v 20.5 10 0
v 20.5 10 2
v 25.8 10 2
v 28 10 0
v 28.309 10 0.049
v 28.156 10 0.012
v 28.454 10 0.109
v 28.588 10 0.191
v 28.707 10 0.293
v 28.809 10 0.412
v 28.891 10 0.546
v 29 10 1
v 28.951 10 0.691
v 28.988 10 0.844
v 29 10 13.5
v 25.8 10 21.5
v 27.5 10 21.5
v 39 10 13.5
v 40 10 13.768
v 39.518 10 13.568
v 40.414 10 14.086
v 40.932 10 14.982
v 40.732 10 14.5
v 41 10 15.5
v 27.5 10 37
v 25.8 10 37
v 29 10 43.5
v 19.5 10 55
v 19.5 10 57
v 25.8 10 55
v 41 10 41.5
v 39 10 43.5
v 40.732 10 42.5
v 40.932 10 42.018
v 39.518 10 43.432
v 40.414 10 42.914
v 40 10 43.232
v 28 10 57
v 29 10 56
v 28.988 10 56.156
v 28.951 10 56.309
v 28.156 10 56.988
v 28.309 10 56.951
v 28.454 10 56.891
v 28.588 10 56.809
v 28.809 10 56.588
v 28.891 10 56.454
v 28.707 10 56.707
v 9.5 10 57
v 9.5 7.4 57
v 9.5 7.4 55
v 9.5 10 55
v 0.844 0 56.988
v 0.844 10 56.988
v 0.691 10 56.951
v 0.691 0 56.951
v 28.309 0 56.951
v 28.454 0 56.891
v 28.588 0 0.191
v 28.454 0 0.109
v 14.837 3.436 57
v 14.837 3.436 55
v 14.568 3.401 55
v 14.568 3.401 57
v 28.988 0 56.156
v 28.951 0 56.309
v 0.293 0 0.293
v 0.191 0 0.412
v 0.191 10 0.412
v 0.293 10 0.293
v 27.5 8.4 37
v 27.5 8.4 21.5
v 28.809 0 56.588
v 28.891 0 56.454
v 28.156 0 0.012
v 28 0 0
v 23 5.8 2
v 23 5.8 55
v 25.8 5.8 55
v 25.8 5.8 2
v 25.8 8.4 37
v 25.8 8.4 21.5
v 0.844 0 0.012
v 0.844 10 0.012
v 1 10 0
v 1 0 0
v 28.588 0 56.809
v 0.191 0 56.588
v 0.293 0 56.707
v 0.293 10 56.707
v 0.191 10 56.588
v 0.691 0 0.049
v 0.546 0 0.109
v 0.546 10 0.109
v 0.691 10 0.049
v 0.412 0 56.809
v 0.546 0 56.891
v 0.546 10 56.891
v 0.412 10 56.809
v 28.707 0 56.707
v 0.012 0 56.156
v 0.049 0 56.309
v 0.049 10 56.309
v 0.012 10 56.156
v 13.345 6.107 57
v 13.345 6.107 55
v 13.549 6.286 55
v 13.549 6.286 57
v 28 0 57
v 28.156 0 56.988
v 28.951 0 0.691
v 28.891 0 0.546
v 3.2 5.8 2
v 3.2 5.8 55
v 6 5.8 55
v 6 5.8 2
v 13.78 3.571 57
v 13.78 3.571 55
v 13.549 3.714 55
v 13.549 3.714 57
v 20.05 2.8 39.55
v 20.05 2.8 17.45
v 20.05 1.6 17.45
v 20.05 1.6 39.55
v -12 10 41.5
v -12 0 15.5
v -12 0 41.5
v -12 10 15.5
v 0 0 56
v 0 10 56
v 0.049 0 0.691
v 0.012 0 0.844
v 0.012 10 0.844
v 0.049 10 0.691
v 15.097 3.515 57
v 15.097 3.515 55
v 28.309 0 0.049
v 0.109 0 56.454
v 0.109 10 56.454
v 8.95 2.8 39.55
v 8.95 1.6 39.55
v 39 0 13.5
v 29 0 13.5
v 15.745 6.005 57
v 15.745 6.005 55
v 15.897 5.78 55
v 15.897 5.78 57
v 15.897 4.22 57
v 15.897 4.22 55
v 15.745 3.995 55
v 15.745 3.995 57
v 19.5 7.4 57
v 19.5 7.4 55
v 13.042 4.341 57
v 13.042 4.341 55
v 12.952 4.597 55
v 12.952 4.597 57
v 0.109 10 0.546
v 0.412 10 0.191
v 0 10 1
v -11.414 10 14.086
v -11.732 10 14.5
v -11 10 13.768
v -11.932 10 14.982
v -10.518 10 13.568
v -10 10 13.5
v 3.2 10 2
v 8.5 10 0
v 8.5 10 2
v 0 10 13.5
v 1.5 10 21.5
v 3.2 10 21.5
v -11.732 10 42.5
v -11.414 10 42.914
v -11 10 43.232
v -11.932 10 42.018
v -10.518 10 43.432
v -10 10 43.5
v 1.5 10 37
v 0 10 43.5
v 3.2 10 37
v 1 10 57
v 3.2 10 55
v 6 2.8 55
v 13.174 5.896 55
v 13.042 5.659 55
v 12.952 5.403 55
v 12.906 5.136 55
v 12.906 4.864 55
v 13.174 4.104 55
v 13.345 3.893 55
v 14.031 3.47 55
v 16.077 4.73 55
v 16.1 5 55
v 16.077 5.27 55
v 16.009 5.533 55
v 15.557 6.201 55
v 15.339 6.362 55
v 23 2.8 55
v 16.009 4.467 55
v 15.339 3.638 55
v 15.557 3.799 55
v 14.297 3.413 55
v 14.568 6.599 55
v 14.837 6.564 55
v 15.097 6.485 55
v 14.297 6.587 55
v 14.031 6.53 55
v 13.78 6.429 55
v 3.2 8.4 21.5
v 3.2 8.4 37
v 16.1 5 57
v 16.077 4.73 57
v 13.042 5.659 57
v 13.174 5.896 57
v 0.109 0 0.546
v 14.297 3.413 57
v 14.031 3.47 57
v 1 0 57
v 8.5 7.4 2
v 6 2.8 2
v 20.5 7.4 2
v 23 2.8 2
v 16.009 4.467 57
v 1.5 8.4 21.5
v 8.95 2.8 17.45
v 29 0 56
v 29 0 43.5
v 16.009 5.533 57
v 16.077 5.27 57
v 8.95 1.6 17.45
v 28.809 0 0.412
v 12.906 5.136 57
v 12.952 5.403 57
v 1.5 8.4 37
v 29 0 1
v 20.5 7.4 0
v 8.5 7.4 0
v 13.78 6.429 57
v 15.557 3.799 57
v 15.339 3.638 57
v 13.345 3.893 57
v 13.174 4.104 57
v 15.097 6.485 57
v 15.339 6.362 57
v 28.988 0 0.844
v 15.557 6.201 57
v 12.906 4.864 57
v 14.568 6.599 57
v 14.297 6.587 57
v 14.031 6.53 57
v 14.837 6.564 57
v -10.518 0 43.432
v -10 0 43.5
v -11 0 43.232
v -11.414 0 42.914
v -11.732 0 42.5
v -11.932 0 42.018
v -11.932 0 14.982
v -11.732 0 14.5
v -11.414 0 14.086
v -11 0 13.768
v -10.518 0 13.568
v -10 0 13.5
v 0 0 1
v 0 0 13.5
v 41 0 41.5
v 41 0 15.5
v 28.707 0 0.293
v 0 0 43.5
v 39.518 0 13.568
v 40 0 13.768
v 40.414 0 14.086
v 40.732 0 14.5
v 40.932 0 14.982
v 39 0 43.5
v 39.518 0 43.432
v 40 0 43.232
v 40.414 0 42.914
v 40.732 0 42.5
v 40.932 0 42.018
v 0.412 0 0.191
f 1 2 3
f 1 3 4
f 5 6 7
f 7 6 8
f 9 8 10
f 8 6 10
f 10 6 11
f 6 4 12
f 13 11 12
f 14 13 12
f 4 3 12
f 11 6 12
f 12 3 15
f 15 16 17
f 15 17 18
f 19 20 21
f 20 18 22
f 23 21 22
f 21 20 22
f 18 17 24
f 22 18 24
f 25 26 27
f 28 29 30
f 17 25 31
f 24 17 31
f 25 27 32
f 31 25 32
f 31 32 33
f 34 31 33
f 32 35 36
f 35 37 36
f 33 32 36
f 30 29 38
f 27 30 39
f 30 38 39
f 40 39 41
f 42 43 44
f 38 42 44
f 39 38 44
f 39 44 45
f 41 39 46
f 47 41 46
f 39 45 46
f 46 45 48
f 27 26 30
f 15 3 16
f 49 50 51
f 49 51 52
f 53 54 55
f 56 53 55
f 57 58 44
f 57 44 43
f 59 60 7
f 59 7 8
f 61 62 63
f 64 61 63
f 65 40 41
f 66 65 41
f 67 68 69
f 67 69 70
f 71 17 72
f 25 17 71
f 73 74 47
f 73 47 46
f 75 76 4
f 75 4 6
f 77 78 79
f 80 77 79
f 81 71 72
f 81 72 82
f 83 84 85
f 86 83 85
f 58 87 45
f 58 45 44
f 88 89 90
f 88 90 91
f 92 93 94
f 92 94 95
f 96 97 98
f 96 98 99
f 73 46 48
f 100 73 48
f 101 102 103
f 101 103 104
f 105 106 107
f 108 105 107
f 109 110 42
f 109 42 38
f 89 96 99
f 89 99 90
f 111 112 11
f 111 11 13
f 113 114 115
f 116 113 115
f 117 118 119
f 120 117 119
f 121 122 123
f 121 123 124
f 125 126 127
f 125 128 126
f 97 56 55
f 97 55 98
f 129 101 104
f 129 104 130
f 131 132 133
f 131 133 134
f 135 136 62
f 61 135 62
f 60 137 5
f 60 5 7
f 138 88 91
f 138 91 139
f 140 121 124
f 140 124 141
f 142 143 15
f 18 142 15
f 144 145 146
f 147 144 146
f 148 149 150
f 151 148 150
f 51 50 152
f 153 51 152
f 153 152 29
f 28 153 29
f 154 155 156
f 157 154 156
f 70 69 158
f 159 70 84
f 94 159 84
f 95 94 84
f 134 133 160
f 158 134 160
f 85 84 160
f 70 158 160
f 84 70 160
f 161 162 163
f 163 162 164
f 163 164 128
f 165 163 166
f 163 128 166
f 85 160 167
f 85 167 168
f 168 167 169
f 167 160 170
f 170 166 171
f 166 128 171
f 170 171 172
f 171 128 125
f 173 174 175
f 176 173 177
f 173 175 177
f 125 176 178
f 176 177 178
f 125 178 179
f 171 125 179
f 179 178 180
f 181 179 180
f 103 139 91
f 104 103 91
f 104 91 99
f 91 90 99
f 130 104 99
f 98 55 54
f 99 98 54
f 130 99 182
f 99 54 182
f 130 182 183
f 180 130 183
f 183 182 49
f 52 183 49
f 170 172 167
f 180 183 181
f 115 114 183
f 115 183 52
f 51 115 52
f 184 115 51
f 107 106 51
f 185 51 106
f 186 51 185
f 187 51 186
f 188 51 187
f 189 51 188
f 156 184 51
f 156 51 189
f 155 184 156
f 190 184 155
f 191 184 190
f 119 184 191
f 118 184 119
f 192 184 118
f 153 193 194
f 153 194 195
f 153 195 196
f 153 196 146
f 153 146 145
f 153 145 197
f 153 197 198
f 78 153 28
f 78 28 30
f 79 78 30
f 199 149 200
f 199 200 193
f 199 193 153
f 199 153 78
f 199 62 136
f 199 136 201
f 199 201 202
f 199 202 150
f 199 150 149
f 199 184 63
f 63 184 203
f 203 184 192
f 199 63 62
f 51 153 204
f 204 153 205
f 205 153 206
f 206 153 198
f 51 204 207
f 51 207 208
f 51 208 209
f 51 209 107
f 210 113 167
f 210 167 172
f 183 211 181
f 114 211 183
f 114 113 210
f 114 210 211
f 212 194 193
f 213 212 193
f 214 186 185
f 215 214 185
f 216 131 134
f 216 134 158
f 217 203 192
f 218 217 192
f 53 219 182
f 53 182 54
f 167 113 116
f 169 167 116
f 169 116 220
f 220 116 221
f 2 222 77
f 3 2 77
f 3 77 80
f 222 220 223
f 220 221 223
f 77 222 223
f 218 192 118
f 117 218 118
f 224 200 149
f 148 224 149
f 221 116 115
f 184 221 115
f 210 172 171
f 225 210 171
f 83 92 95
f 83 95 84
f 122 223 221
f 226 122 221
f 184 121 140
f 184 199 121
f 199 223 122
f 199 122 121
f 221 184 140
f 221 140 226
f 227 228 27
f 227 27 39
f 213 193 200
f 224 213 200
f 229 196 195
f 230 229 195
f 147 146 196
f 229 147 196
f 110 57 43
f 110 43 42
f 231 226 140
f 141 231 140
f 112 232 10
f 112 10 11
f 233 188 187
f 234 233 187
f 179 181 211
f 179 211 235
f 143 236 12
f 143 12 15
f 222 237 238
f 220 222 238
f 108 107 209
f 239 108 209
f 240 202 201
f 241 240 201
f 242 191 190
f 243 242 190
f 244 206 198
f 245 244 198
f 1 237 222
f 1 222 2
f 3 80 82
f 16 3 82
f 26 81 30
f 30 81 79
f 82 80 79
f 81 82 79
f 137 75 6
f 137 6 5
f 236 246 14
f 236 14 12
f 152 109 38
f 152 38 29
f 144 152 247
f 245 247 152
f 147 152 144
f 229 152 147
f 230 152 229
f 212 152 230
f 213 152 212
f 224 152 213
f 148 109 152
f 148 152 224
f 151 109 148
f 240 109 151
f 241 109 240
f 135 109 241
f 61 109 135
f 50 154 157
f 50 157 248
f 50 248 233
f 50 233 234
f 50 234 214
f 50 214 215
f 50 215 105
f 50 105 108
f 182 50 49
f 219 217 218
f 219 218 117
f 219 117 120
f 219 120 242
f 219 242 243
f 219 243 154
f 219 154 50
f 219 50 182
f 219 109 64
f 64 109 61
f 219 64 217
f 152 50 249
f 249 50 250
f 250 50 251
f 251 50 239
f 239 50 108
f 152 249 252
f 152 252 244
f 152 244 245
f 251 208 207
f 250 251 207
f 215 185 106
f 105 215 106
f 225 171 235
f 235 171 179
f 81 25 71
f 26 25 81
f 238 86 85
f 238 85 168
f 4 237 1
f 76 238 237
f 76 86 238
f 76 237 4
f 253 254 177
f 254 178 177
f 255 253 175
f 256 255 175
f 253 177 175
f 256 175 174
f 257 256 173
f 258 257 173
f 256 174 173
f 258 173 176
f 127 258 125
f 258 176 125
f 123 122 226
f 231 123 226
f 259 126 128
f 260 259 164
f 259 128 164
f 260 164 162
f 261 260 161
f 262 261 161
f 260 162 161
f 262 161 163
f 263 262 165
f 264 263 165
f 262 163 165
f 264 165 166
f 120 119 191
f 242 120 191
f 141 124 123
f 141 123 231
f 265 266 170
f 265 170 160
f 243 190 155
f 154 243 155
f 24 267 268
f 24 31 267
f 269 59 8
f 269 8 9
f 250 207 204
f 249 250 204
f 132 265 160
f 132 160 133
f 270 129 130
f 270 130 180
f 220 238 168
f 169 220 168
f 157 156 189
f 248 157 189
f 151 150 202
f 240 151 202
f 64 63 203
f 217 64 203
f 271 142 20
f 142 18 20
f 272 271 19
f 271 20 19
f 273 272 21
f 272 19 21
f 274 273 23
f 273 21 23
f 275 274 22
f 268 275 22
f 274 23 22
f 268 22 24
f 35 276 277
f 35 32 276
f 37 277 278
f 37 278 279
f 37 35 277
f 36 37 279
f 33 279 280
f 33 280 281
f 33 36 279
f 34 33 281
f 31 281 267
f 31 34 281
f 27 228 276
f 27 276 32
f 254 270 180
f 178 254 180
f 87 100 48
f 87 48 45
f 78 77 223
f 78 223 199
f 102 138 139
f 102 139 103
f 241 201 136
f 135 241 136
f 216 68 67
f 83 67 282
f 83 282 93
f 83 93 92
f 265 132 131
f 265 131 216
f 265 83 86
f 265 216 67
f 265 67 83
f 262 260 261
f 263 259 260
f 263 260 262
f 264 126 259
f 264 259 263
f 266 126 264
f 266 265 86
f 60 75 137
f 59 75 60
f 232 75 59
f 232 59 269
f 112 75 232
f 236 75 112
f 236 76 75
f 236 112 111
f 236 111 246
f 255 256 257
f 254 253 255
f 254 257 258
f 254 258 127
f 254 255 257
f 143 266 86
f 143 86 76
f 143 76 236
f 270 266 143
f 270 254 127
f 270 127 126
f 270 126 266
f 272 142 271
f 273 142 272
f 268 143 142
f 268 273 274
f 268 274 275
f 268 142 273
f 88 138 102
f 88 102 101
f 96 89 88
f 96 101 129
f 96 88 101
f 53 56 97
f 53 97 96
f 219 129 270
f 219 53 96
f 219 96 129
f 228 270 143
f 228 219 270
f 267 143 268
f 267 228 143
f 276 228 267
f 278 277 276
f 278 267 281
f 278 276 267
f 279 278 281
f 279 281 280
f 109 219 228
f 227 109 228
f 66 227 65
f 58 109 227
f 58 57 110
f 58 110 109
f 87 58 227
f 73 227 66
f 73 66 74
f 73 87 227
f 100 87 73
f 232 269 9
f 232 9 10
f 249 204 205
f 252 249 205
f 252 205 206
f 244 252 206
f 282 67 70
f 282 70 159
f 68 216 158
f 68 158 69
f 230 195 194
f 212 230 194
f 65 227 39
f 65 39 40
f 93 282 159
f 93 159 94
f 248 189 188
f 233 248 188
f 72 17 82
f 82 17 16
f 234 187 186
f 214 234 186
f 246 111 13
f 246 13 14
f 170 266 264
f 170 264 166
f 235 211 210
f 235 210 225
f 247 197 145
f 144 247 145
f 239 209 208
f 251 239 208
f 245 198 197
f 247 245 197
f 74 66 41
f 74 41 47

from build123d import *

# Parameters (mm, degrees)
BOSS_EXTRUDE1_DEPTH = 9.999999776
SKETCH2_W           = 17.000000924
SKETCH2_H           = 52.999999374
CUT_EXTRUDE1_DEPTH  = 7.199999876
CUT_EXTRUDE2_REACH  = 66.216
SKETCH4_W           = 2.799998969
SKETCH4_H           = 52.999999374
CUT_EXTRUDE3_REACH  = 66.216
SKETCH6_W           = 2.7999999
SKETCH6_H           = 52.999999374
CUT_EXTRUDE4_REACH  = 66.73
SKETCH7_W           = 10.000000707
SKETCH7_H           = 2.599999774
CUT_EXTRUDE5_REACH  = 66.73
SKETCH8_W           = 12.000000104
SKETCH8_H           = 2.599999774
CUT_EXTRUDE6_DEPTH  = 63.976185295
SKETCH10_W          = 1.699999906
SKETCH10_H          = 15.499999747
CUT_EXTRUDE7_DEPTH  = 1.600000076
SKETCH11_W          = 1.700000837
SKETCH11_H          = 15.499999747
CUT_EXTRUDE8_DEPTH  = 1.600000076
SKETCH12_W          = 11.099998839
SKETCH12_H          = 22.099997848
CUT_EXTRUDE9_DEPTH  = 1.199999941
SKETCH13_W          = 30
SKETCH13_H          = 9.999999776
BOSS_EXTRUDE2_DEPTH = 12
SKETCH14_W          = 30
SKETCH14_H          = 9.999999776
BOSS_EXTRUDE3_DEPTH = 12
FILLET1_R           = 2


with BuildPart() as part:
    # Sketch1 → Boss-Extrude1 (new body)
    with BuildSketch(Plane.XZ):
        Polygon((0.84356498, 0.012312084), (0.999999233, 0), (28.000000864, 0), (28.156435117, 0.012312084), (28.30901742, 0.048942864), (28.453988954, 0.108992681), (28.587784618, 0.190982595), (28.707107529, 0.292893499), (28.80901657, 0.412214547), (28.891006485, 0.546010211), (28.951056302, 0.690983608), (28.987688944, 0.843565969), (28.999999166, 1.000000164), (28.999999166, 56.000001729), (28.987688944, 56.156434119), (28.951056302, 56.309018284), (28.891006485, 56.453991681), (28.80901657, 56.587785482), (28.707107529, 56.707106531), (28.587784618, 56.809015572), (28.453988954, 56.891005486), (28.30901742, 56.951057166), (28.156435117, 56.987687945), (28.000000864, 57.00000003), (0.999999233, 57.00000003), (0.84356498, 56.987687945), (0.690982677, 56.951057166), (0.54600928, 56.891005486), (0.412214547, 56.809015572), (0.292892568, 56.707106531), (0.190982595, 56.587785482), (0.108992681, 56.453991681), (0.048942864, 56.309018284), (0.012311153, 56.156434119), (0, 56.000001729), (0, 1.000000164), (0.012311153, 0.843565969), (0.048942864, 0.690983608), (0.108992681, 0.546010211), (0.190982595, 0.412214547), (0.292892568, 0.292893499), (0.412214547, 0.190982595), (0.54600928, 0.108992681), (0.690982677, 0.048942864), align=None)
    extrude(amount=-BOSS_EXTRUDE1_DEPTH)

    # Sketch2 → Cut-Extrude1 (cut)
    with BuildSketch(Plane(origin=(0, 9.999999776, 0), x_dir=(-1, 0, 0), z_dir=(0, 1, 0))):
        with Locations((-14.499999583, 28.500000015)):
            Rectangle(SKETCH2_W, SKETCH2_H)
    extrude(amount=-CUT_EXTRUDE1_DEPTH, mode=Mode.SUBTRACT)

    # Sketch4 → Cut-Extrude2 (cut, up to next)
    with BuildSketch(Plane.XZ.offset(-5.799999926), mode=Mode.PRIVATE) as cut_extrude2_sk1:
        with Locations((24.39999953, 28.500000015)):
            Rectangle(SKETCH4_W, SKETCH4_H)
    cut_extrude2_tool1 = extrude(cut_extrude2_sk1.sketch, amount=-CUT_EXTRUDE2_REACH, mode=Mode.PRIVATE) & part.part
    add(cut_extrude2_tool1.solids().sort_by_distance((24.4, 5.8, 28.5))[0], mode=Mode.SUBTRACT)

    # Sketch6 → Cut-Extrude3 (cut, up to next)
    with BuildSketch(Plane.XZ.offset(-5.799999926), mode=Mode.PRIVATE) as cut_extrude3_sk1:
        with Locations((4.599999171, 28.500000015)):
            Rectangle(SKETCH6_W, SKETCH6_H)
    cut_extrude3_tool1 = extrude(cut_extrude3_sk1.sketch, amount=-CUT_EXTRUDE3_REACH, mode=Mode.PRIVATE) & part.part
    add(cut_extrude3_tool1.solids().sort_by_distance((4.599999, 5.8, 28.5))[0], mode=Mode.SUBTRACT)

    # Sketch7 → Cut-Extrude4 (cut, up to next)
    with BuildSketch(Plane.XY.offset(57.00000003), mode=Mode.PRIVATE) as cut_extrude4_sk1:
        with Locations((14.500000049, 8.699999889)):
            Rectangle(SKETCH7_W, SKETCH7_H)
    cut_extrude4_tool1 = extrude(cut_extrude4_sk1.sketch, amount=-CUT_EXTRUDE4_REACH, mode=Mode.PRIVATE) & part.part
    add(cut_extrude4_tool1.solids().sort_by_distance((14.5, 8.7, 57))[0], mode=Mode.SUBTRACT)

    # Sketch8 → Cut-Extrude5 (cut, up to next)
    with BuildSketch(Plane(origin=(0, 0, 0), x_dir=(-1, 0, 0), z_dir=(0, 0, -1)), mode=Mode.PRIVATE) as cut_extrude5_sk1:
        with Locations((-14.500000514, 8.699999889)):
            Rectangle(SKETCH8_W, SKETCH8_H)
    cut_extrude5_tool1 = extrude(cut_extrude5_sk1.sketch, amount=-CUT_EXTRUDE5_REACH, mode=Mode.PRIVATE) & part.part
    add(cut_extrude5_tool1.solids().sort_by_distance((14.500001, 8.7, 0))[0], mode=Mode.SUBTRACT)

    # Sketch9 → Cut-Extrude6 (cut, through all)
    with BuildSketch(Plane(origin=(0, 0, 54.999999702), x_dir=(-1, 0, 0), z_dir=(0, 0, -1))):
        Polygon((-16.008604318, 4.466976505), (-15.896821395, 4.219688009), (-15.74485749, 3.994848114), (-15.557079576, 3.798924387), (-15.338891186, 3.637553426), (-15.096570365, 3.515377408), (-14.837087132, 3.435911611), (-14.567905106, 3.401441732), (-14.296771027, 3.412959399), (-14.03148286, 3.470133292), (-13.779673725, 3.571318695), (-13.548586518, 3.713604528), (-13.344869949, 3.892897861), (-13.174383901, 4.104040563), (-13.042034581, 4.34095785), (-12.951626442, 4.596835002), (-12.905763462, 4.86431038), (-12.905763462, 5.135689396), (-12.951626442, 5.403164774), (-13.042034581, 5.659041926), (-13.174383901, 5.895959679), (-13.344869949, 6.107102148), (-13.548586518, 6.286395248), (-13.779673725, 6.428681314), (-14.03148286, 6.529866718), (-14.296771027, 6.587040611), (-14.567905106, 6.598558277), (-14.837087132, 6.564088166), (-15.096570365, 6.484622601), (-15.338891186, 6.362446584), (-15.557079576, 6.201075856), (-15.74485749, 6.005152129), (-15.896821395, 5.780311767), (-16.008604318, 5.533023737), (-16.076983884, 5.270401482), (-16.10000059, 4.999999888), (-16.076983884, 4.729599226), align=None)
    extrude(amount=-CUT_EXTRUDE6_DEPTH, mode=Mode.SUBTRACT)

    # Sketch10 → Cut-Extrude7 (cut)
    with BuildSketch(Plane(origin=(0, 9.999999776, 0), x_dir=(-1, 0, 0), z_dir=(0, 1, 0))):
        with Locations((-2.349999268, 29.250000603)):
            Rectangle(SKETCH10_W, SKETCH10_H)
    extrude(amount=-CUT_EXTRUDE7_DEPTH, mode=Mode.SUBTRACT)

    # Sketch11 → Cut-Extrude8 (cut)
    with BuildSketch(Plane(origin=(0, 9.999999776, 0), x_dir=(-1, 0, 0), z_dir=(0, 1, 0))):
        with Locations((-26.649999433, 29.250000603)):
            Rectangle(SKETCH11_W, SKETCH11_H)
    extrude(amount=-CUT_EXTRUDE8_DEPTH, mode=Mode.SUBTRACT)

    # Sketch12 → Cut-Extrude9 (cut)
    with BuildSketch(Plane(origin=(0, 2.7999999, 0), x_dir=(-1, 0, 0), z_dir=(0, 1, 0))):
        with Locations((-14.499999117, 28.500000015)):
            Rectangle(SKETCH12_W, SKETCH12_H)
    extrude(amount=-CUT_EXTRUDE9_DEPTH, mode=Mode.SUBTRACT)

    # Sketch13 → Boss-Extrude2 (add)
    with BuildSketch(Plane.ZY):
        with Locations((28.500000946, 4.999999888)):
            Rectangle(SKETCH13_W, SKETCH13_H)
    extrude(amount=BOSS_EXTRUDE2_DEPTH)

    # Sketch14 → Boss-Extrude3 (add)
    with BuildSketch(Plane(origin=(28.999999166, 0, 0), x_dir=(0, 0, -1), z_dir=(1, 0, 0))):
        with Locations((-28.500000946, 4.999999888)):
            Rectangle(SKETCH14_W, SKETCH14_H)
    extrude(amount=BOSS_EXTRUDE3_DEPTH)

    # Fillet1
    fillet1_edges = [part.edges().sort_by_distance(p)[0] for p in [
        (-12, 4.999999888, 13.500000946),
        (-12, 4.999999888, 43.500000946),
        (40.999999166, 4.999999888, 43.500000946),
        (40.999999166, 4.999999888, 13.500000946),
    ]]
    fillet(fillet1_edges, radius=FILLET1_R)


solid = part.part
